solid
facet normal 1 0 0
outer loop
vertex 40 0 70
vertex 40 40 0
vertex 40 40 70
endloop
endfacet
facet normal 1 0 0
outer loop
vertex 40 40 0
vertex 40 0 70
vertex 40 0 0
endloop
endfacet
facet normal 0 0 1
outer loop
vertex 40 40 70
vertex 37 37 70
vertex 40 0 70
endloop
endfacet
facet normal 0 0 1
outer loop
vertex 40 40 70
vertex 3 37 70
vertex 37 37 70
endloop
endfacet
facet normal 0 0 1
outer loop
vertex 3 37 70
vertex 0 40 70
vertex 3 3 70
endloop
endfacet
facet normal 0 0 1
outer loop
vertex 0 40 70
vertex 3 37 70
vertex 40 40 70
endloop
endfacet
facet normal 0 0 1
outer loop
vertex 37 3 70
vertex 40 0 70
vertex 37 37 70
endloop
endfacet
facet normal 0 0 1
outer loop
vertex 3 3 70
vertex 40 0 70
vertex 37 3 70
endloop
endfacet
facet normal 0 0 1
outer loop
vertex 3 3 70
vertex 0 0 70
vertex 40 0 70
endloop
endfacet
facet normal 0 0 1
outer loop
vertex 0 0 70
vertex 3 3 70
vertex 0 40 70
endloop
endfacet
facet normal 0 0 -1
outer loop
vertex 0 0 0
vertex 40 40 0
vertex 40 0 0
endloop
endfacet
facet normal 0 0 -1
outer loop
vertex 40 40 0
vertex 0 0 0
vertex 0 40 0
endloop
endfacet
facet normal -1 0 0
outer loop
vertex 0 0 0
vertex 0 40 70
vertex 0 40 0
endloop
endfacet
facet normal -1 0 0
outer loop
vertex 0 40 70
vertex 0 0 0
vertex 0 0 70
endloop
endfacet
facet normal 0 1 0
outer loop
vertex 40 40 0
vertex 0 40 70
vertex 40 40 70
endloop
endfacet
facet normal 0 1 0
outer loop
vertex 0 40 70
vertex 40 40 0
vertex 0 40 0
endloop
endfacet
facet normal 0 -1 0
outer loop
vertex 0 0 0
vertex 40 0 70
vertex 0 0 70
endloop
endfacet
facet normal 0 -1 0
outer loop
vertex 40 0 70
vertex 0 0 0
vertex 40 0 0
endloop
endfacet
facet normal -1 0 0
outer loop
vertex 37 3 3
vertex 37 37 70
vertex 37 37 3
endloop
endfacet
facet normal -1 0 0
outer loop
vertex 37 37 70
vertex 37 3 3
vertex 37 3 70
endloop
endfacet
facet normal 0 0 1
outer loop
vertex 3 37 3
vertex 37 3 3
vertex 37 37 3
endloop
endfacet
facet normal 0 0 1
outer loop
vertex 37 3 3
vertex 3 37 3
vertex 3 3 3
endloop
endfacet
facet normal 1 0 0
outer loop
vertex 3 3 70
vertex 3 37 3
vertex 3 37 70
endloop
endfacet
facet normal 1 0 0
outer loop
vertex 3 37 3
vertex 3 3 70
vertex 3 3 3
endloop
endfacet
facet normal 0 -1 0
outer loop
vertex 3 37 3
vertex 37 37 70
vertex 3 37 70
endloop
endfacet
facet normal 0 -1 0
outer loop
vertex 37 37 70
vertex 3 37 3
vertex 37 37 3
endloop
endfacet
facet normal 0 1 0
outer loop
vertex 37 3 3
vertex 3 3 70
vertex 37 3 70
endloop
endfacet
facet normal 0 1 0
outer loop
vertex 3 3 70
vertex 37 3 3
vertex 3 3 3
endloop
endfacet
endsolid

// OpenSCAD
module ADLAdapter(w,l,h,t){
    difference(){
        cube([w,l,h]);
        translate([t,t,t]) cube([w-2*t,l-2*t,h-t]);
    }
}

ADLAdapter(40,40, 70,3);
